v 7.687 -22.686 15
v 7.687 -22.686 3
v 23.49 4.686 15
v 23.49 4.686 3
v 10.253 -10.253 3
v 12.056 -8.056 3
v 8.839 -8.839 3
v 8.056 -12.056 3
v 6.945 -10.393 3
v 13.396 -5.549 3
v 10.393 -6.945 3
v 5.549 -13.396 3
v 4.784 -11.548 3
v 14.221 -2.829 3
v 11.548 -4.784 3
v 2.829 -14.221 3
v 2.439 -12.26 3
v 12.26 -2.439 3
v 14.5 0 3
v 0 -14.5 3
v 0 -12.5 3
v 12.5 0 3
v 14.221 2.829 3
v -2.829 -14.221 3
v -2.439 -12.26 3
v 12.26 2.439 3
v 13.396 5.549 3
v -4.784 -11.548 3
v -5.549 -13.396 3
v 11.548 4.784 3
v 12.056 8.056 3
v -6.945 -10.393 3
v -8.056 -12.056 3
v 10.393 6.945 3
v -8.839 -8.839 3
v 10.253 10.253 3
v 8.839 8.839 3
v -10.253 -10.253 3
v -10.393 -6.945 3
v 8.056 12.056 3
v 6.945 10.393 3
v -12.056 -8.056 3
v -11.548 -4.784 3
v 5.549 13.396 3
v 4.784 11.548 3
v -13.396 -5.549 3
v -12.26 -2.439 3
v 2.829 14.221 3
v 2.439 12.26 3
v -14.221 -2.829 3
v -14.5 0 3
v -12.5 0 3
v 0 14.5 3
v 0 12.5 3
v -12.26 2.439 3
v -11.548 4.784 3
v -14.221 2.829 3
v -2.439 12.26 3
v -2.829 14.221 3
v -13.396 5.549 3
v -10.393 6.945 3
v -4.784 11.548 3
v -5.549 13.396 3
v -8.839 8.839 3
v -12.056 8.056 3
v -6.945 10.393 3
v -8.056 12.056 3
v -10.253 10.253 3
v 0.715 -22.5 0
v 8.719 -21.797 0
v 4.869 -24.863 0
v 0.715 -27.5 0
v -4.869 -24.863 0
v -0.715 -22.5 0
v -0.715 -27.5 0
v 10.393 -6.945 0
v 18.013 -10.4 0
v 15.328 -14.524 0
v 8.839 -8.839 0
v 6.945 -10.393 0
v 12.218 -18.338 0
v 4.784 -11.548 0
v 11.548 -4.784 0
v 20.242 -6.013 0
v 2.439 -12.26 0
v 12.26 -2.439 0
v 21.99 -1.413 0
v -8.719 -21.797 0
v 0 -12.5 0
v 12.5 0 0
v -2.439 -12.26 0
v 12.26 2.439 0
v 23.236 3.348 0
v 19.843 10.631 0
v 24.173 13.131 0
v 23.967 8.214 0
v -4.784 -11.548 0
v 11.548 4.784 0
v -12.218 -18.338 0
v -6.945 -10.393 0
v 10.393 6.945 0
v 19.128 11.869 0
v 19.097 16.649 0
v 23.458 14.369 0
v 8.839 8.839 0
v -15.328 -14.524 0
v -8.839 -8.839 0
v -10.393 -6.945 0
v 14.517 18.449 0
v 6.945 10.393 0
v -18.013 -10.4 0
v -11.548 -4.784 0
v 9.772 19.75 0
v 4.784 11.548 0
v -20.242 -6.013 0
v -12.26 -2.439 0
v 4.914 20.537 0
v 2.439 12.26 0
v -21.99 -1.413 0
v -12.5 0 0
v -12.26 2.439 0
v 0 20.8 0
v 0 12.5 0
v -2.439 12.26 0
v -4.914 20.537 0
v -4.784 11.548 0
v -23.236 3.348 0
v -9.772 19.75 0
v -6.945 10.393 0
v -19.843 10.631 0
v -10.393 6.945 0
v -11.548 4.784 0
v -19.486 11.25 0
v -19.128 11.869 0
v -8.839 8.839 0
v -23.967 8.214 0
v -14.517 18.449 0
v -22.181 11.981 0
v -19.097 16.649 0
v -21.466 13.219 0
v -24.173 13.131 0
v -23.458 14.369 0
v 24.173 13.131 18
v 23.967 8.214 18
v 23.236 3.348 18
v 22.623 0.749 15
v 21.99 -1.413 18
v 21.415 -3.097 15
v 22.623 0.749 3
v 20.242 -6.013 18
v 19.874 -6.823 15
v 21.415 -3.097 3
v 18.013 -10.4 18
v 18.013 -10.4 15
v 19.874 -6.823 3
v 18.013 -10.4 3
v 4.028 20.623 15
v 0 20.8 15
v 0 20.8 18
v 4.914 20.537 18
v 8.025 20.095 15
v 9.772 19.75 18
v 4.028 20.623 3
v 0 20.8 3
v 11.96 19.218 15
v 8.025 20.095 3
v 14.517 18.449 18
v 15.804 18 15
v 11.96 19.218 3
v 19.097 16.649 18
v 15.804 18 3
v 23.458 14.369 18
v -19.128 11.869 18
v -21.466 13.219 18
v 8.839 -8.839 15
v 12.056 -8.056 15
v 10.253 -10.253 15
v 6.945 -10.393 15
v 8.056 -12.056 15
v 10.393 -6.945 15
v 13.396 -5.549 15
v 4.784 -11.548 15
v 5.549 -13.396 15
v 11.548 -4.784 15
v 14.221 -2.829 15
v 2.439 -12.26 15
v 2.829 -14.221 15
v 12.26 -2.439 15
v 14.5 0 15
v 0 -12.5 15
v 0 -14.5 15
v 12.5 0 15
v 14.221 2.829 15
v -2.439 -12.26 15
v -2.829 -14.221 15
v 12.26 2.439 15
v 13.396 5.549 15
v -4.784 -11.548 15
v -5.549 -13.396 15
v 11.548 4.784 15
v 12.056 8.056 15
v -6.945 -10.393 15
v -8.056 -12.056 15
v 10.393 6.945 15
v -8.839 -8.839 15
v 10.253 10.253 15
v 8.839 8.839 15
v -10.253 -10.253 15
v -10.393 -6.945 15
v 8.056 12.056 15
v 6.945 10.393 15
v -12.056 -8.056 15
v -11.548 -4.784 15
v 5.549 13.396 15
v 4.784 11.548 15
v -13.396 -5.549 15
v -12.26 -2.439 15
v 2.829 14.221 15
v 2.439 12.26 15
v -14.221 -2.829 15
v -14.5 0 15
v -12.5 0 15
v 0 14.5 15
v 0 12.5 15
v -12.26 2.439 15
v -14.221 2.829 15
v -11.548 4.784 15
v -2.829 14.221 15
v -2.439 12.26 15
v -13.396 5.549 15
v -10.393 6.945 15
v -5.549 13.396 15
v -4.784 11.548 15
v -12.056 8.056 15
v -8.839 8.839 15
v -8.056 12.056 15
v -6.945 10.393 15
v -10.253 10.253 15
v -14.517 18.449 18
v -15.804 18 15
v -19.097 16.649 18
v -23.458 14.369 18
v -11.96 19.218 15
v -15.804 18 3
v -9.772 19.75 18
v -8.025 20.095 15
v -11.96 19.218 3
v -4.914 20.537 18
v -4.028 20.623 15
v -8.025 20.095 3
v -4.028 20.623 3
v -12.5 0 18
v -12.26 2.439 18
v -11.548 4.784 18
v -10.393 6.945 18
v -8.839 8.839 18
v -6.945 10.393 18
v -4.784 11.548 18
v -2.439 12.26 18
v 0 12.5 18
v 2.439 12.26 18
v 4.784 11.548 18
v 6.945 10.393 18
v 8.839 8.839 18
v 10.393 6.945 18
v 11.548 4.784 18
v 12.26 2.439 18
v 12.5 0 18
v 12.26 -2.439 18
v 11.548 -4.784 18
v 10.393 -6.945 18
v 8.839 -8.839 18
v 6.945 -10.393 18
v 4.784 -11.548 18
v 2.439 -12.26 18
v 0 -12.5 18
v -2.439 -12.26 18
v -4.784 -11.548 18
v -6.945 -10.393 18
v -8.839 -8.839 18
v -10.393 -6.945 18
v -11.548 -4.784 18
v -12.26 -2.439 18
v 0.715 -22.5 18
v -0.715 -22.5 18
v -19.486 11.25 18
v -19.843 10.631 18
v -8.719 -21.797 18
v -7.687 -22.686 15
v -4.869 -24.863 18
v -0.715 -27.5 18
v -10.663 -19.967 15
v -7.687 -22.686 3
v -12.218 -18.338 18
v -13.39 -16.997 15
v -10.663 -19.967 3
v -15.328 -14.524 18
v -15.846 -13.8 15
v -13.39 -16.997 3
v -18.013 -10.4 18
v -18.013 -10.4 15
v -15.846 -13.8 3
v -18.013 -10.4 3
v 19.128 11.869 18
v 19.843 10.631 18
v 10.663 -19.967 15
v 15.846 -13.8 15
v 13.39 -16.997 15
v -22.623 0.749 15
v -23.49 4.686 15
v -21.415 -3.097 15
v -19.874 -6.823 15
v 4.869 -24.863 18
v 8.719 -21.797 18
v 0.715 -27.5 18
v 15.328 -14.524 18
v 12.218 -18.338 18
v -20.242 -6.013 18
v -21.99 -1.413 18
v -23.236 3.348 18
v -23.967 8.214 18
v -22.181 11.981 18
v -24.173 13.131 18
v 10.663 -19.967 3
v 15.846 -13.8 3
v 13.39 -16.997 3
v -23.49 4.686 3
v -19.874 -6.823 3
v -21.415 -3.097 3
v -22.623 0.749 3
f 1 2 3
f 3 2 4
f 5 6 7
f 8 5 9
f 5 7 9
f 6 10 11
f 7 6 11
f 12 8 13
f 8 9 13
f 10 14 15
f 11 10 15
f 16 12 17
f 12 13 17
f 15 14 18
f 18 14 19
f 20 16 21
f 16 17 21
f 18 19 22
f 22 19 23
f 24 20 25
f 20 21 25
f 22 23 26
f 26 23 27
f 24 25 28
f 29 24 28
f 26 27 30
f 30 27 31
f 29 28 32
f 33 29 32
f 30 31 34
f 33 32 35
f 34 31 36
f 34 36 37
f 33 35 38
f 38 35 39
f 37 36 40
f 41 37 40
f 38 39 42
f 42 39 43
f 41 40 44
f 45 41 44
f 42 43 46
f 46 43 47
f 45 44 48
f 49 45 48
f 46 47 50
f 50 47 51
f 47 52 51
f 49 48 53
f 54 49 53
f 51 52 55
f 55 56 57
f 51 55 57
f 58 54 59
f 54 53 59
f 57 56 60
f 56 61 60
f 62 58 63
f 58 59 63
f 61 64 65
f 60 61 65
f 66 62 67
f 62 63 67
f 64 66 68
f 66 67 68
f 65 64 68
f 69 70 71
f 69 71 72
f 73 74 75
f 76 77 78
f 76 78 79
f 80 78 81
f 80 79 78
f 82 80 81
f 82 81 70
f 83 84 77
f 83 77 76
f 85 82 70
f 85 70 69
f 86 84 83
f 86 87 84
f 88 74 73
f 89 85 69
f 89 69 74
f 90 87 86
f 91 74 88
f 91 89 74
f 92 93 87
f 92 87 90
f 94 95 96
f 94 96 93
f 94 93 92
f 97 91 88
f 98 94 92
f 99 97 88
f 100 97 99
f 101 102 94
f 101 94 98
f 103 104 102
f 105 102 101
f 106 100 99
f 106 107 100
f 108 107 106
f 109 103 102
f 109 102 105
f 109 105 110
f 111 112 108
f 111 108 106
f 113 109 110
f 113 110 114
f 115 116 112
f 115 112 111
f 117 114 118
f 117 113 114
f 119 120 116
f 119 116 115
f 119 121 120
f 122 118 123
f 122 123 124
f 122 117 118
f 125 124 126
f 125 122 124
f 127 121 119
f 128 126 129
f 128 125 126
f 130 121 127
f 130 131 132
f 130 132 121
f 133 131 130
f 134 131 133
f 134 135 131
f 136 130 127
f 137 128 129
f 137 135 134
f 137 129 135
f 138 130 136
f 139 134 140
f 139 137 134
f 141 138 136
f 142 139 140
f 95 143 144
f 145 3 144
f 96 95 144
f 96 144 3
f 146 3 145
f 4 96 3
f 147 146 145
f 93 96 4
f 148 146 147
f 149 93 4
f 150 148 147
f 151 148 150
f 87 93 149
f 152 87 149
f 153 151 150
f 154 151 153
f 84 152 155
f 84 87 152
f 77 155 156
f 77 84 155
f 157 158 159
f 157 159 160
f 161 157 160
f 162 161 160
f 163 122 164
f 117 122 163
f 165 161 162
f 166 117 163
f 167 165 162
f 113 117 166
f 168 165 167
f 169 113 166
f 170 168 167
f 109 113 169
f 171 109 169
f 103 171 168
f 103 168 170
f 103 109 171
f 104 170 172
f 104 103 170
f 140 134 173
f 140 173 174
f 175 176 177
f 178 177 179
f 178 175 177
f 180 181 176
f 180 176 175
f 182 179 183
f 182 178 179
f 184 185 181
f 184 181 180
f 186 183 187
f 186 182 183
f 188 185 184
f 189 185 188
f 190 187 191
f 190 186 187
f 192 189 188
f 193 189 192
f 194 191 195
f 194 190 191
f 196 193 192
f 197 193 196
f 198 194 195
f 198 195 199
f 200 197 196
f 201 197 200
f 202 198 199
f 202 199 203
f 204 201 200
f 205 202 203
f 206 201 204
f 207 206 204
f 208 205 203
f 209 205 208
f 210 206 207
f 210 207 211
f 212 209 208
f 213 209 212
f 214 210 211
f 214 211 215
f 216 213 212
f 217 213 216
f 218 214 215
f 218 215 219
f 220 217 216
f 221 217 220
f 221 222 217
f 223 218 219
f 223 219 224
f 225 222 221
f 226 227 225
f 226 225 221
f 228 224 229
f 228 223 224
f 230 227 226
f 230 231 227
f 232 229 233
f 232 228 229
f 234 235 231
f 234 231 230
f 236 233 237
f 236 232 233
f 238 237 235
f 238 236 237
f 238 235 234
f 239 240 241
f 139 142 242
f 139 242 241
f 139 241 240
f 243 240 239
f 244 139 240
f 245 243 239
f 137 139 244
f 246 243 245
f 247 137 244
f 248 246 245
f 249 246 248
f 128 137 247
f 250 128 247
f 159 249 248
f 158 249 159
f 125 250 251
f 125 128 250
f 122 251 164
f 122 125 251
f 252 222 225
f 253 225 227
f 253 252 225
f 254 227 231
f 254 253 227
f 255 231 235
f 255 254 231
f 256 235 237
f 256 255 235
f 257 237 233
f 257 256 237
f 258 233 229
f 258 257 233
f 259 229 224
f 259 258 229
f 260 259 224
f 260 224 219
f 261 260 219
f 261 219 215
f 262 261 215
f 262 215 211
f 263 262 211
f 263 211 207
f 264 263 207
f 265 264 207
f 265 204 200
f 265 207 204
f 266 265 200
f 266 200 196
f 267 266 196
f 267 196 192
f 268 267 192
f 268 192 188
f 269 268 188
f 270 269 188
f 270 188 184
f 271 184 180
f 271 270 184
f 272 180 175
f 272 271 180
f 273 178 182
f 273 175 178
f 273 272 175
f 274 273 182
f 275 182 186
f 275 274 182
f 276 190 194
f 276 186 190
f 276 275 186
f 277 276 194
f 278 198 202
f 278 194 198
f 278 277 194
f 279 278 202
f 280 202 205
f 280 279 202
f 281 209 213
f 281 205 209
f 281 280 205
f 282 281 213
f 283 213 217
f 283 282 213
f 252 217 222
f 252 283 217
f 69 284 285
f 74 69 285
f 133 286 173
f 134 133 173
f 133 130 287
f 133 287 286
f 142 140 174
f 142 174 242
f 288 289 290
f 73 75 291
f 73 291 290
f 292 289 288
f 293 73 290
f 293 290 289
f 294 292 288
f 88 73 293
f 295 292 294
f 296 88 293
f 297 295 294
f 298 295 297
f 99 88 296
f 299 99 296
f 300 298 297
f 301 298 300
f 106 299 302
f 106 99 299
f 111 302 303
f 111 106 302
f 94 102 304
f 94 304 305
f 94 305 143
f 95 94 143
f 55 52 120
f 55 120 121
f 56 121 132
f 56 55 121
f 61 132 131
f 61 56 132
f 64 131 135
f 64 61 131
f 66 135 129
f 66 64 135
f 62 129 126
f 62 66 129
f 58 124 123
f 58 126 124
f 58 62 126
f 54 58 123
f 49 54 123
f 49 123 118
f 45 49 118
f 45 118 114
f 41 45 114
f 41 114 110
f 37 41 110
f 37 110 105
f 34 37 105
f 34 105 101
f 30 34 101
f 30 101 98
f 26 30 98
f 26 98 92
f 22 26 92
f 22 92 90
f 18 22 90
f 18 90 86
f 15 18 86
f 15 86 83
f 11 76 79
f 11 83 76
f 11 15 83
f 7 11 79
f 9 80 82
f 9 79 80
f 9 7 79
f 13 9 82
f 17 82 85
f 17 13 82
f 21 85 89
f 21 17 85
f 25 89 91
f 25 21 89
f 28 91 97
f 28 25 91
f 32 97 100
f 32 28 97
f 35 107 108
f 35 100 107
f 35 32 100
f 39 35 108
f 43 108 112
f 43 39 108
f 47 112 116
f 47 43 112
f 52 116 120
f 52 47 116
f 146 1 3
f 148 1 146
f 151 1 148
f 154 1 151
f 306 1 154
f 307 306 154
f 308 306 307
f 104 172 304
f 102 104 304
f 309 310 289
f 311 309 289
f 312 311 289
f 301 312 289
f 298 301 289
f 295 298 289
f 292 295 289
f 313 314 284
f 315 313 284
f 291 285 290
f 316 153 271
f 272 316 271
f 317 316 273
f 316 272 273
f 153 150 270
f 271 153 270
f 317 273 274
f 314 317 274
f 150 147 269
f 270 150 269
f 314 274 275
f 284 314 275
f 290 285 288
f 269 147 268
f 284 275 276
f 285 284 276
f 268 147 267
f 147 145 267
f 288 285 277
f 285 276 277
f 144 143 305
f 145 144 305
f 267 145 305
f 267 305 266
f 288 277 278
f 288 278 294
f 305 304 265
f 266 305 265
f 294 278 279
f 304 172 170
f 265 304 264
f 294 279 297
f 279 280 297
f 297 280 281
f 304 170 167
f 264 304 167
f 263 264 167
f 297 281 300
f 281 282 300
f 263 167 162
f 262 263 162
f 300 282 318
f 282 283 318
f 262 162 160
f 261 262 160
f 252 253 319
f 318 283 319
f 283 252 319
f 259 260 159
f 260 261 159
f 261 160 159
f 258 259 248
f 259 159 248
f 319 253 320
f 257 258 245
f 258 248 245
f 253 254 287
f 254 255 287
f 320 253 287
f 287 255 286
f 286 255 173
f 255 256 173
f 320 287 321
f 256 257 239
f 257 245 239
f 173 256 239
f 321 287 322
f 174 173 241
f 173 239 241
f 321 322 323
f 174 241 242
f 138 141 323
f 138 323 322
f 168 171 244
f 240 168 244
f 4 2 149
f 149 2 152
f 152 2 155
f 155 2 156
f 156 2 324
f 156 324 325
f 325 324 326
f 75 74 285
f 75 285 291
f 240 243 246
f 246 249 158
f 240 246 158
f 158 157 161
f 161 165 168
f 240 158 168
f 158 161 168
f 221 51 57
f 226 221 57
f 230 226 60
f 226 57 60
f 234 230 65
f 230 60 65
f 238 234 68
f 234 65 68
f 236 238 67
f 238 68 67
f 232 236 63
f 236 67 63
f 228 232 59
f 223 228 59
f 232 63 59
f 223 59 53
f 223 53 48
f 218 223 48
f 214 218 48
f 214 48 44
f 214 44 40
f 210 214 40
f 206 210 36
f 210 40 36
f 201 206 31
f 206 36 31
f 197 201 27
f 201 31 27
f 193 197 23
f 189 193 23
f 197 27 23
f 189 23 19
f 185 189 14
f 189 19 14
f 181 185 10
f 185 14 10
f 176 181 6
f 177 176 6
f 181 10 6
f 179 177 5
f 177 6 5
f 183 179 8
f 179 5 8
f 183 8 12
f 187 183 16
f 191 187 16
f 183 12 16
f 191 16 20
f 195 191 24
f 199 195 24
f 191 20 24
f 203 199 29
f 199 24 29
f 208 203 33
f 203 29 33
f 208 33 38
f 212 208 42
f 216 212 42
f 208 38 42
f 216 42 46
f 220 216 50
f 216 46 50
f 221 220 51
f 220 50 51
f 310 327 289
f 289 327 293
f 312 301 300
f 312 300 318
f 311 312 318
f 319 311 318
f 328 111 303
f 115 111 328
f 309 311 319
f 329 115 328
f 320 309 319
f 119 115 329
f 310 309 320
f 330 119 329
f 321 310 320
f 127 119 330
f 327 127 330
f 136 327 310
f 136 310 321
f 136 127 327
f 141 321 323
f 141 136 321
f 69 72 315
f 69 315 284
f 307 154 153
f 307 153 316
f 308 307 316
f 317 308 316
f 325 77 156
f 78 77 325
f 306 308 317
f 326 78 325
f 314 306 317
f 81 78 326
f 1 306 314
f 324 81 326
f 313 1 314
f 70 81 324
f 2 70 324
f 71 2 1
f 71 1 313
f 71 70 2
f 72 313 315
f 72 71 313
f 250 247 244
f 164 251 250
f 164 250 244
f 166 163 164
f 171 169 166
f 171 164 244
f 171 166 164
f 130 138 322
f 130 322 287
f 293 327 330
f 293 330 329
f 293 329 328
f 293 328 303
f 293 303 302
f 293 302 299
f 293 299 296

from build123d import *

# Parameters (mm, degrees)
BASE_EXTRUDE_DEPTH           = 18
COMBUSTION_CHAMBER_PROFILE_R = 14.5
CUT_EXTRUDE1_DEPTH           = 12
SKETCH6_R                    = 12.5
CUT_EXTRUDE5_DEPTH           = 19


with BuildPart() as part:
    # rotor profile → Base-Extrude (new body)
    with BuildSketch(Plane.XY):
        with BuildLine():
            Line((-24.173095266, 13.130970823), (-22.181236837, 11.980970823))
            Line((-22.181236837, 11.980970823), (-19.842968247, 10.630970823))
            Line((-19.842968247, 10.630970823), (-19.485571583, 11.250000003))
            Line((-19.485571583, 11.250000003), (-19.128174923, 11.869029177))
            Line((-19.128174923, 11.869029177), (-21.466443514, 13.219029177))
            Line((-21.466443514, 13.219029177), (-23.458301942, 14.369029177))
            ThreePointArc((-23.458301942, 14.369029177), (-12.161921268, 19.163134144), (0, 20.8))
            ThreePointArc((0, 20.8), (12.161921268, 19.163134144), (23.458301942, 14.369029177))
            Line((23.458301942, 14.369029177), (19.128174923, 11.869029177))
            Line((19.128174923, 11.869029177), (19.485571585, 11.25))
            Line((19.485571585, 11.25), (19.842968247, 10.630970823))
            Line((19.842968247, 10.630970823), (24.173095266, 13.130970823))
            ThreePointArc((24.173095266, 13.130970823), (22.676721619, 0.950965705), (18.013328399, -10.4))
            ThreePointArc((18.013328399, -10.4), (10.514800351, -20.114099849), (0.714793324, -27.5))
            Line((0.714793324, -27.5), (0.714793324, -22.5))
            Line((0.714793324, -22.5), (0, -22.5))
            Line((0, -22.5), (-0.714793324, -22.5))
            Line((-0.714793324, -22.5), (-0.714793324, -27.5))
            ThreePointArc((-0.714793324, -27.5), (-10.514800351, -20.114099849), (-18.013328399, -10.4))
            ThreePointArc((-18.013328399, -10.4), (-22.676721619, 0.950965705), (-24.173095266, 13.130970823))
        make_face()
    extrude(amount=BASE_EXTRUDE_DEPTH)

    # combustion chamber profile → Cut-Extrude1 (cut)
    with BuildSketch(Plane(origin=(0, 0, 3), x_dir=(-1, 0, 0), z_dir=(0, 0, -1))):
        Circle(COMBUSTION_CHAMBER_PROFILE_R)
        Polygon((18, 21), (18, 18), (0, 18), (-18, 18), (-18, 21), align=None)
        Polygon((-9.186533479, -26.088457268), (-27.186533479, 5.088457268), (-24.588457268, 6.588457268), (-15.588457268, -9), (-6.588457268, -24.588457268), align=None)
        Polygon((27.186533479, 5.088457268), (9.186533479, -26.088457268), (6.588457268, -24.588457268), (15.588457268, -9), (24.588457268, 6.588457268), align=None)
    extrude(amount=-CUT_EXTRUDE1_DEPTH, mode=Mode.SUBTRACT)

    # Sketch6 → Cut-Extrude5 (cut, through all)
    with BuildSketch(Plane(origin=(0, 0, 18), x_dir=(-1, 0, 0), z_dir=(0, 0, -1))):
        Circle(SKETCH6_R)
    extrude(amount=CUT_EXTRUDE5_DEPTH, mode=Mode.SUBTRACT)


solid = part.part
